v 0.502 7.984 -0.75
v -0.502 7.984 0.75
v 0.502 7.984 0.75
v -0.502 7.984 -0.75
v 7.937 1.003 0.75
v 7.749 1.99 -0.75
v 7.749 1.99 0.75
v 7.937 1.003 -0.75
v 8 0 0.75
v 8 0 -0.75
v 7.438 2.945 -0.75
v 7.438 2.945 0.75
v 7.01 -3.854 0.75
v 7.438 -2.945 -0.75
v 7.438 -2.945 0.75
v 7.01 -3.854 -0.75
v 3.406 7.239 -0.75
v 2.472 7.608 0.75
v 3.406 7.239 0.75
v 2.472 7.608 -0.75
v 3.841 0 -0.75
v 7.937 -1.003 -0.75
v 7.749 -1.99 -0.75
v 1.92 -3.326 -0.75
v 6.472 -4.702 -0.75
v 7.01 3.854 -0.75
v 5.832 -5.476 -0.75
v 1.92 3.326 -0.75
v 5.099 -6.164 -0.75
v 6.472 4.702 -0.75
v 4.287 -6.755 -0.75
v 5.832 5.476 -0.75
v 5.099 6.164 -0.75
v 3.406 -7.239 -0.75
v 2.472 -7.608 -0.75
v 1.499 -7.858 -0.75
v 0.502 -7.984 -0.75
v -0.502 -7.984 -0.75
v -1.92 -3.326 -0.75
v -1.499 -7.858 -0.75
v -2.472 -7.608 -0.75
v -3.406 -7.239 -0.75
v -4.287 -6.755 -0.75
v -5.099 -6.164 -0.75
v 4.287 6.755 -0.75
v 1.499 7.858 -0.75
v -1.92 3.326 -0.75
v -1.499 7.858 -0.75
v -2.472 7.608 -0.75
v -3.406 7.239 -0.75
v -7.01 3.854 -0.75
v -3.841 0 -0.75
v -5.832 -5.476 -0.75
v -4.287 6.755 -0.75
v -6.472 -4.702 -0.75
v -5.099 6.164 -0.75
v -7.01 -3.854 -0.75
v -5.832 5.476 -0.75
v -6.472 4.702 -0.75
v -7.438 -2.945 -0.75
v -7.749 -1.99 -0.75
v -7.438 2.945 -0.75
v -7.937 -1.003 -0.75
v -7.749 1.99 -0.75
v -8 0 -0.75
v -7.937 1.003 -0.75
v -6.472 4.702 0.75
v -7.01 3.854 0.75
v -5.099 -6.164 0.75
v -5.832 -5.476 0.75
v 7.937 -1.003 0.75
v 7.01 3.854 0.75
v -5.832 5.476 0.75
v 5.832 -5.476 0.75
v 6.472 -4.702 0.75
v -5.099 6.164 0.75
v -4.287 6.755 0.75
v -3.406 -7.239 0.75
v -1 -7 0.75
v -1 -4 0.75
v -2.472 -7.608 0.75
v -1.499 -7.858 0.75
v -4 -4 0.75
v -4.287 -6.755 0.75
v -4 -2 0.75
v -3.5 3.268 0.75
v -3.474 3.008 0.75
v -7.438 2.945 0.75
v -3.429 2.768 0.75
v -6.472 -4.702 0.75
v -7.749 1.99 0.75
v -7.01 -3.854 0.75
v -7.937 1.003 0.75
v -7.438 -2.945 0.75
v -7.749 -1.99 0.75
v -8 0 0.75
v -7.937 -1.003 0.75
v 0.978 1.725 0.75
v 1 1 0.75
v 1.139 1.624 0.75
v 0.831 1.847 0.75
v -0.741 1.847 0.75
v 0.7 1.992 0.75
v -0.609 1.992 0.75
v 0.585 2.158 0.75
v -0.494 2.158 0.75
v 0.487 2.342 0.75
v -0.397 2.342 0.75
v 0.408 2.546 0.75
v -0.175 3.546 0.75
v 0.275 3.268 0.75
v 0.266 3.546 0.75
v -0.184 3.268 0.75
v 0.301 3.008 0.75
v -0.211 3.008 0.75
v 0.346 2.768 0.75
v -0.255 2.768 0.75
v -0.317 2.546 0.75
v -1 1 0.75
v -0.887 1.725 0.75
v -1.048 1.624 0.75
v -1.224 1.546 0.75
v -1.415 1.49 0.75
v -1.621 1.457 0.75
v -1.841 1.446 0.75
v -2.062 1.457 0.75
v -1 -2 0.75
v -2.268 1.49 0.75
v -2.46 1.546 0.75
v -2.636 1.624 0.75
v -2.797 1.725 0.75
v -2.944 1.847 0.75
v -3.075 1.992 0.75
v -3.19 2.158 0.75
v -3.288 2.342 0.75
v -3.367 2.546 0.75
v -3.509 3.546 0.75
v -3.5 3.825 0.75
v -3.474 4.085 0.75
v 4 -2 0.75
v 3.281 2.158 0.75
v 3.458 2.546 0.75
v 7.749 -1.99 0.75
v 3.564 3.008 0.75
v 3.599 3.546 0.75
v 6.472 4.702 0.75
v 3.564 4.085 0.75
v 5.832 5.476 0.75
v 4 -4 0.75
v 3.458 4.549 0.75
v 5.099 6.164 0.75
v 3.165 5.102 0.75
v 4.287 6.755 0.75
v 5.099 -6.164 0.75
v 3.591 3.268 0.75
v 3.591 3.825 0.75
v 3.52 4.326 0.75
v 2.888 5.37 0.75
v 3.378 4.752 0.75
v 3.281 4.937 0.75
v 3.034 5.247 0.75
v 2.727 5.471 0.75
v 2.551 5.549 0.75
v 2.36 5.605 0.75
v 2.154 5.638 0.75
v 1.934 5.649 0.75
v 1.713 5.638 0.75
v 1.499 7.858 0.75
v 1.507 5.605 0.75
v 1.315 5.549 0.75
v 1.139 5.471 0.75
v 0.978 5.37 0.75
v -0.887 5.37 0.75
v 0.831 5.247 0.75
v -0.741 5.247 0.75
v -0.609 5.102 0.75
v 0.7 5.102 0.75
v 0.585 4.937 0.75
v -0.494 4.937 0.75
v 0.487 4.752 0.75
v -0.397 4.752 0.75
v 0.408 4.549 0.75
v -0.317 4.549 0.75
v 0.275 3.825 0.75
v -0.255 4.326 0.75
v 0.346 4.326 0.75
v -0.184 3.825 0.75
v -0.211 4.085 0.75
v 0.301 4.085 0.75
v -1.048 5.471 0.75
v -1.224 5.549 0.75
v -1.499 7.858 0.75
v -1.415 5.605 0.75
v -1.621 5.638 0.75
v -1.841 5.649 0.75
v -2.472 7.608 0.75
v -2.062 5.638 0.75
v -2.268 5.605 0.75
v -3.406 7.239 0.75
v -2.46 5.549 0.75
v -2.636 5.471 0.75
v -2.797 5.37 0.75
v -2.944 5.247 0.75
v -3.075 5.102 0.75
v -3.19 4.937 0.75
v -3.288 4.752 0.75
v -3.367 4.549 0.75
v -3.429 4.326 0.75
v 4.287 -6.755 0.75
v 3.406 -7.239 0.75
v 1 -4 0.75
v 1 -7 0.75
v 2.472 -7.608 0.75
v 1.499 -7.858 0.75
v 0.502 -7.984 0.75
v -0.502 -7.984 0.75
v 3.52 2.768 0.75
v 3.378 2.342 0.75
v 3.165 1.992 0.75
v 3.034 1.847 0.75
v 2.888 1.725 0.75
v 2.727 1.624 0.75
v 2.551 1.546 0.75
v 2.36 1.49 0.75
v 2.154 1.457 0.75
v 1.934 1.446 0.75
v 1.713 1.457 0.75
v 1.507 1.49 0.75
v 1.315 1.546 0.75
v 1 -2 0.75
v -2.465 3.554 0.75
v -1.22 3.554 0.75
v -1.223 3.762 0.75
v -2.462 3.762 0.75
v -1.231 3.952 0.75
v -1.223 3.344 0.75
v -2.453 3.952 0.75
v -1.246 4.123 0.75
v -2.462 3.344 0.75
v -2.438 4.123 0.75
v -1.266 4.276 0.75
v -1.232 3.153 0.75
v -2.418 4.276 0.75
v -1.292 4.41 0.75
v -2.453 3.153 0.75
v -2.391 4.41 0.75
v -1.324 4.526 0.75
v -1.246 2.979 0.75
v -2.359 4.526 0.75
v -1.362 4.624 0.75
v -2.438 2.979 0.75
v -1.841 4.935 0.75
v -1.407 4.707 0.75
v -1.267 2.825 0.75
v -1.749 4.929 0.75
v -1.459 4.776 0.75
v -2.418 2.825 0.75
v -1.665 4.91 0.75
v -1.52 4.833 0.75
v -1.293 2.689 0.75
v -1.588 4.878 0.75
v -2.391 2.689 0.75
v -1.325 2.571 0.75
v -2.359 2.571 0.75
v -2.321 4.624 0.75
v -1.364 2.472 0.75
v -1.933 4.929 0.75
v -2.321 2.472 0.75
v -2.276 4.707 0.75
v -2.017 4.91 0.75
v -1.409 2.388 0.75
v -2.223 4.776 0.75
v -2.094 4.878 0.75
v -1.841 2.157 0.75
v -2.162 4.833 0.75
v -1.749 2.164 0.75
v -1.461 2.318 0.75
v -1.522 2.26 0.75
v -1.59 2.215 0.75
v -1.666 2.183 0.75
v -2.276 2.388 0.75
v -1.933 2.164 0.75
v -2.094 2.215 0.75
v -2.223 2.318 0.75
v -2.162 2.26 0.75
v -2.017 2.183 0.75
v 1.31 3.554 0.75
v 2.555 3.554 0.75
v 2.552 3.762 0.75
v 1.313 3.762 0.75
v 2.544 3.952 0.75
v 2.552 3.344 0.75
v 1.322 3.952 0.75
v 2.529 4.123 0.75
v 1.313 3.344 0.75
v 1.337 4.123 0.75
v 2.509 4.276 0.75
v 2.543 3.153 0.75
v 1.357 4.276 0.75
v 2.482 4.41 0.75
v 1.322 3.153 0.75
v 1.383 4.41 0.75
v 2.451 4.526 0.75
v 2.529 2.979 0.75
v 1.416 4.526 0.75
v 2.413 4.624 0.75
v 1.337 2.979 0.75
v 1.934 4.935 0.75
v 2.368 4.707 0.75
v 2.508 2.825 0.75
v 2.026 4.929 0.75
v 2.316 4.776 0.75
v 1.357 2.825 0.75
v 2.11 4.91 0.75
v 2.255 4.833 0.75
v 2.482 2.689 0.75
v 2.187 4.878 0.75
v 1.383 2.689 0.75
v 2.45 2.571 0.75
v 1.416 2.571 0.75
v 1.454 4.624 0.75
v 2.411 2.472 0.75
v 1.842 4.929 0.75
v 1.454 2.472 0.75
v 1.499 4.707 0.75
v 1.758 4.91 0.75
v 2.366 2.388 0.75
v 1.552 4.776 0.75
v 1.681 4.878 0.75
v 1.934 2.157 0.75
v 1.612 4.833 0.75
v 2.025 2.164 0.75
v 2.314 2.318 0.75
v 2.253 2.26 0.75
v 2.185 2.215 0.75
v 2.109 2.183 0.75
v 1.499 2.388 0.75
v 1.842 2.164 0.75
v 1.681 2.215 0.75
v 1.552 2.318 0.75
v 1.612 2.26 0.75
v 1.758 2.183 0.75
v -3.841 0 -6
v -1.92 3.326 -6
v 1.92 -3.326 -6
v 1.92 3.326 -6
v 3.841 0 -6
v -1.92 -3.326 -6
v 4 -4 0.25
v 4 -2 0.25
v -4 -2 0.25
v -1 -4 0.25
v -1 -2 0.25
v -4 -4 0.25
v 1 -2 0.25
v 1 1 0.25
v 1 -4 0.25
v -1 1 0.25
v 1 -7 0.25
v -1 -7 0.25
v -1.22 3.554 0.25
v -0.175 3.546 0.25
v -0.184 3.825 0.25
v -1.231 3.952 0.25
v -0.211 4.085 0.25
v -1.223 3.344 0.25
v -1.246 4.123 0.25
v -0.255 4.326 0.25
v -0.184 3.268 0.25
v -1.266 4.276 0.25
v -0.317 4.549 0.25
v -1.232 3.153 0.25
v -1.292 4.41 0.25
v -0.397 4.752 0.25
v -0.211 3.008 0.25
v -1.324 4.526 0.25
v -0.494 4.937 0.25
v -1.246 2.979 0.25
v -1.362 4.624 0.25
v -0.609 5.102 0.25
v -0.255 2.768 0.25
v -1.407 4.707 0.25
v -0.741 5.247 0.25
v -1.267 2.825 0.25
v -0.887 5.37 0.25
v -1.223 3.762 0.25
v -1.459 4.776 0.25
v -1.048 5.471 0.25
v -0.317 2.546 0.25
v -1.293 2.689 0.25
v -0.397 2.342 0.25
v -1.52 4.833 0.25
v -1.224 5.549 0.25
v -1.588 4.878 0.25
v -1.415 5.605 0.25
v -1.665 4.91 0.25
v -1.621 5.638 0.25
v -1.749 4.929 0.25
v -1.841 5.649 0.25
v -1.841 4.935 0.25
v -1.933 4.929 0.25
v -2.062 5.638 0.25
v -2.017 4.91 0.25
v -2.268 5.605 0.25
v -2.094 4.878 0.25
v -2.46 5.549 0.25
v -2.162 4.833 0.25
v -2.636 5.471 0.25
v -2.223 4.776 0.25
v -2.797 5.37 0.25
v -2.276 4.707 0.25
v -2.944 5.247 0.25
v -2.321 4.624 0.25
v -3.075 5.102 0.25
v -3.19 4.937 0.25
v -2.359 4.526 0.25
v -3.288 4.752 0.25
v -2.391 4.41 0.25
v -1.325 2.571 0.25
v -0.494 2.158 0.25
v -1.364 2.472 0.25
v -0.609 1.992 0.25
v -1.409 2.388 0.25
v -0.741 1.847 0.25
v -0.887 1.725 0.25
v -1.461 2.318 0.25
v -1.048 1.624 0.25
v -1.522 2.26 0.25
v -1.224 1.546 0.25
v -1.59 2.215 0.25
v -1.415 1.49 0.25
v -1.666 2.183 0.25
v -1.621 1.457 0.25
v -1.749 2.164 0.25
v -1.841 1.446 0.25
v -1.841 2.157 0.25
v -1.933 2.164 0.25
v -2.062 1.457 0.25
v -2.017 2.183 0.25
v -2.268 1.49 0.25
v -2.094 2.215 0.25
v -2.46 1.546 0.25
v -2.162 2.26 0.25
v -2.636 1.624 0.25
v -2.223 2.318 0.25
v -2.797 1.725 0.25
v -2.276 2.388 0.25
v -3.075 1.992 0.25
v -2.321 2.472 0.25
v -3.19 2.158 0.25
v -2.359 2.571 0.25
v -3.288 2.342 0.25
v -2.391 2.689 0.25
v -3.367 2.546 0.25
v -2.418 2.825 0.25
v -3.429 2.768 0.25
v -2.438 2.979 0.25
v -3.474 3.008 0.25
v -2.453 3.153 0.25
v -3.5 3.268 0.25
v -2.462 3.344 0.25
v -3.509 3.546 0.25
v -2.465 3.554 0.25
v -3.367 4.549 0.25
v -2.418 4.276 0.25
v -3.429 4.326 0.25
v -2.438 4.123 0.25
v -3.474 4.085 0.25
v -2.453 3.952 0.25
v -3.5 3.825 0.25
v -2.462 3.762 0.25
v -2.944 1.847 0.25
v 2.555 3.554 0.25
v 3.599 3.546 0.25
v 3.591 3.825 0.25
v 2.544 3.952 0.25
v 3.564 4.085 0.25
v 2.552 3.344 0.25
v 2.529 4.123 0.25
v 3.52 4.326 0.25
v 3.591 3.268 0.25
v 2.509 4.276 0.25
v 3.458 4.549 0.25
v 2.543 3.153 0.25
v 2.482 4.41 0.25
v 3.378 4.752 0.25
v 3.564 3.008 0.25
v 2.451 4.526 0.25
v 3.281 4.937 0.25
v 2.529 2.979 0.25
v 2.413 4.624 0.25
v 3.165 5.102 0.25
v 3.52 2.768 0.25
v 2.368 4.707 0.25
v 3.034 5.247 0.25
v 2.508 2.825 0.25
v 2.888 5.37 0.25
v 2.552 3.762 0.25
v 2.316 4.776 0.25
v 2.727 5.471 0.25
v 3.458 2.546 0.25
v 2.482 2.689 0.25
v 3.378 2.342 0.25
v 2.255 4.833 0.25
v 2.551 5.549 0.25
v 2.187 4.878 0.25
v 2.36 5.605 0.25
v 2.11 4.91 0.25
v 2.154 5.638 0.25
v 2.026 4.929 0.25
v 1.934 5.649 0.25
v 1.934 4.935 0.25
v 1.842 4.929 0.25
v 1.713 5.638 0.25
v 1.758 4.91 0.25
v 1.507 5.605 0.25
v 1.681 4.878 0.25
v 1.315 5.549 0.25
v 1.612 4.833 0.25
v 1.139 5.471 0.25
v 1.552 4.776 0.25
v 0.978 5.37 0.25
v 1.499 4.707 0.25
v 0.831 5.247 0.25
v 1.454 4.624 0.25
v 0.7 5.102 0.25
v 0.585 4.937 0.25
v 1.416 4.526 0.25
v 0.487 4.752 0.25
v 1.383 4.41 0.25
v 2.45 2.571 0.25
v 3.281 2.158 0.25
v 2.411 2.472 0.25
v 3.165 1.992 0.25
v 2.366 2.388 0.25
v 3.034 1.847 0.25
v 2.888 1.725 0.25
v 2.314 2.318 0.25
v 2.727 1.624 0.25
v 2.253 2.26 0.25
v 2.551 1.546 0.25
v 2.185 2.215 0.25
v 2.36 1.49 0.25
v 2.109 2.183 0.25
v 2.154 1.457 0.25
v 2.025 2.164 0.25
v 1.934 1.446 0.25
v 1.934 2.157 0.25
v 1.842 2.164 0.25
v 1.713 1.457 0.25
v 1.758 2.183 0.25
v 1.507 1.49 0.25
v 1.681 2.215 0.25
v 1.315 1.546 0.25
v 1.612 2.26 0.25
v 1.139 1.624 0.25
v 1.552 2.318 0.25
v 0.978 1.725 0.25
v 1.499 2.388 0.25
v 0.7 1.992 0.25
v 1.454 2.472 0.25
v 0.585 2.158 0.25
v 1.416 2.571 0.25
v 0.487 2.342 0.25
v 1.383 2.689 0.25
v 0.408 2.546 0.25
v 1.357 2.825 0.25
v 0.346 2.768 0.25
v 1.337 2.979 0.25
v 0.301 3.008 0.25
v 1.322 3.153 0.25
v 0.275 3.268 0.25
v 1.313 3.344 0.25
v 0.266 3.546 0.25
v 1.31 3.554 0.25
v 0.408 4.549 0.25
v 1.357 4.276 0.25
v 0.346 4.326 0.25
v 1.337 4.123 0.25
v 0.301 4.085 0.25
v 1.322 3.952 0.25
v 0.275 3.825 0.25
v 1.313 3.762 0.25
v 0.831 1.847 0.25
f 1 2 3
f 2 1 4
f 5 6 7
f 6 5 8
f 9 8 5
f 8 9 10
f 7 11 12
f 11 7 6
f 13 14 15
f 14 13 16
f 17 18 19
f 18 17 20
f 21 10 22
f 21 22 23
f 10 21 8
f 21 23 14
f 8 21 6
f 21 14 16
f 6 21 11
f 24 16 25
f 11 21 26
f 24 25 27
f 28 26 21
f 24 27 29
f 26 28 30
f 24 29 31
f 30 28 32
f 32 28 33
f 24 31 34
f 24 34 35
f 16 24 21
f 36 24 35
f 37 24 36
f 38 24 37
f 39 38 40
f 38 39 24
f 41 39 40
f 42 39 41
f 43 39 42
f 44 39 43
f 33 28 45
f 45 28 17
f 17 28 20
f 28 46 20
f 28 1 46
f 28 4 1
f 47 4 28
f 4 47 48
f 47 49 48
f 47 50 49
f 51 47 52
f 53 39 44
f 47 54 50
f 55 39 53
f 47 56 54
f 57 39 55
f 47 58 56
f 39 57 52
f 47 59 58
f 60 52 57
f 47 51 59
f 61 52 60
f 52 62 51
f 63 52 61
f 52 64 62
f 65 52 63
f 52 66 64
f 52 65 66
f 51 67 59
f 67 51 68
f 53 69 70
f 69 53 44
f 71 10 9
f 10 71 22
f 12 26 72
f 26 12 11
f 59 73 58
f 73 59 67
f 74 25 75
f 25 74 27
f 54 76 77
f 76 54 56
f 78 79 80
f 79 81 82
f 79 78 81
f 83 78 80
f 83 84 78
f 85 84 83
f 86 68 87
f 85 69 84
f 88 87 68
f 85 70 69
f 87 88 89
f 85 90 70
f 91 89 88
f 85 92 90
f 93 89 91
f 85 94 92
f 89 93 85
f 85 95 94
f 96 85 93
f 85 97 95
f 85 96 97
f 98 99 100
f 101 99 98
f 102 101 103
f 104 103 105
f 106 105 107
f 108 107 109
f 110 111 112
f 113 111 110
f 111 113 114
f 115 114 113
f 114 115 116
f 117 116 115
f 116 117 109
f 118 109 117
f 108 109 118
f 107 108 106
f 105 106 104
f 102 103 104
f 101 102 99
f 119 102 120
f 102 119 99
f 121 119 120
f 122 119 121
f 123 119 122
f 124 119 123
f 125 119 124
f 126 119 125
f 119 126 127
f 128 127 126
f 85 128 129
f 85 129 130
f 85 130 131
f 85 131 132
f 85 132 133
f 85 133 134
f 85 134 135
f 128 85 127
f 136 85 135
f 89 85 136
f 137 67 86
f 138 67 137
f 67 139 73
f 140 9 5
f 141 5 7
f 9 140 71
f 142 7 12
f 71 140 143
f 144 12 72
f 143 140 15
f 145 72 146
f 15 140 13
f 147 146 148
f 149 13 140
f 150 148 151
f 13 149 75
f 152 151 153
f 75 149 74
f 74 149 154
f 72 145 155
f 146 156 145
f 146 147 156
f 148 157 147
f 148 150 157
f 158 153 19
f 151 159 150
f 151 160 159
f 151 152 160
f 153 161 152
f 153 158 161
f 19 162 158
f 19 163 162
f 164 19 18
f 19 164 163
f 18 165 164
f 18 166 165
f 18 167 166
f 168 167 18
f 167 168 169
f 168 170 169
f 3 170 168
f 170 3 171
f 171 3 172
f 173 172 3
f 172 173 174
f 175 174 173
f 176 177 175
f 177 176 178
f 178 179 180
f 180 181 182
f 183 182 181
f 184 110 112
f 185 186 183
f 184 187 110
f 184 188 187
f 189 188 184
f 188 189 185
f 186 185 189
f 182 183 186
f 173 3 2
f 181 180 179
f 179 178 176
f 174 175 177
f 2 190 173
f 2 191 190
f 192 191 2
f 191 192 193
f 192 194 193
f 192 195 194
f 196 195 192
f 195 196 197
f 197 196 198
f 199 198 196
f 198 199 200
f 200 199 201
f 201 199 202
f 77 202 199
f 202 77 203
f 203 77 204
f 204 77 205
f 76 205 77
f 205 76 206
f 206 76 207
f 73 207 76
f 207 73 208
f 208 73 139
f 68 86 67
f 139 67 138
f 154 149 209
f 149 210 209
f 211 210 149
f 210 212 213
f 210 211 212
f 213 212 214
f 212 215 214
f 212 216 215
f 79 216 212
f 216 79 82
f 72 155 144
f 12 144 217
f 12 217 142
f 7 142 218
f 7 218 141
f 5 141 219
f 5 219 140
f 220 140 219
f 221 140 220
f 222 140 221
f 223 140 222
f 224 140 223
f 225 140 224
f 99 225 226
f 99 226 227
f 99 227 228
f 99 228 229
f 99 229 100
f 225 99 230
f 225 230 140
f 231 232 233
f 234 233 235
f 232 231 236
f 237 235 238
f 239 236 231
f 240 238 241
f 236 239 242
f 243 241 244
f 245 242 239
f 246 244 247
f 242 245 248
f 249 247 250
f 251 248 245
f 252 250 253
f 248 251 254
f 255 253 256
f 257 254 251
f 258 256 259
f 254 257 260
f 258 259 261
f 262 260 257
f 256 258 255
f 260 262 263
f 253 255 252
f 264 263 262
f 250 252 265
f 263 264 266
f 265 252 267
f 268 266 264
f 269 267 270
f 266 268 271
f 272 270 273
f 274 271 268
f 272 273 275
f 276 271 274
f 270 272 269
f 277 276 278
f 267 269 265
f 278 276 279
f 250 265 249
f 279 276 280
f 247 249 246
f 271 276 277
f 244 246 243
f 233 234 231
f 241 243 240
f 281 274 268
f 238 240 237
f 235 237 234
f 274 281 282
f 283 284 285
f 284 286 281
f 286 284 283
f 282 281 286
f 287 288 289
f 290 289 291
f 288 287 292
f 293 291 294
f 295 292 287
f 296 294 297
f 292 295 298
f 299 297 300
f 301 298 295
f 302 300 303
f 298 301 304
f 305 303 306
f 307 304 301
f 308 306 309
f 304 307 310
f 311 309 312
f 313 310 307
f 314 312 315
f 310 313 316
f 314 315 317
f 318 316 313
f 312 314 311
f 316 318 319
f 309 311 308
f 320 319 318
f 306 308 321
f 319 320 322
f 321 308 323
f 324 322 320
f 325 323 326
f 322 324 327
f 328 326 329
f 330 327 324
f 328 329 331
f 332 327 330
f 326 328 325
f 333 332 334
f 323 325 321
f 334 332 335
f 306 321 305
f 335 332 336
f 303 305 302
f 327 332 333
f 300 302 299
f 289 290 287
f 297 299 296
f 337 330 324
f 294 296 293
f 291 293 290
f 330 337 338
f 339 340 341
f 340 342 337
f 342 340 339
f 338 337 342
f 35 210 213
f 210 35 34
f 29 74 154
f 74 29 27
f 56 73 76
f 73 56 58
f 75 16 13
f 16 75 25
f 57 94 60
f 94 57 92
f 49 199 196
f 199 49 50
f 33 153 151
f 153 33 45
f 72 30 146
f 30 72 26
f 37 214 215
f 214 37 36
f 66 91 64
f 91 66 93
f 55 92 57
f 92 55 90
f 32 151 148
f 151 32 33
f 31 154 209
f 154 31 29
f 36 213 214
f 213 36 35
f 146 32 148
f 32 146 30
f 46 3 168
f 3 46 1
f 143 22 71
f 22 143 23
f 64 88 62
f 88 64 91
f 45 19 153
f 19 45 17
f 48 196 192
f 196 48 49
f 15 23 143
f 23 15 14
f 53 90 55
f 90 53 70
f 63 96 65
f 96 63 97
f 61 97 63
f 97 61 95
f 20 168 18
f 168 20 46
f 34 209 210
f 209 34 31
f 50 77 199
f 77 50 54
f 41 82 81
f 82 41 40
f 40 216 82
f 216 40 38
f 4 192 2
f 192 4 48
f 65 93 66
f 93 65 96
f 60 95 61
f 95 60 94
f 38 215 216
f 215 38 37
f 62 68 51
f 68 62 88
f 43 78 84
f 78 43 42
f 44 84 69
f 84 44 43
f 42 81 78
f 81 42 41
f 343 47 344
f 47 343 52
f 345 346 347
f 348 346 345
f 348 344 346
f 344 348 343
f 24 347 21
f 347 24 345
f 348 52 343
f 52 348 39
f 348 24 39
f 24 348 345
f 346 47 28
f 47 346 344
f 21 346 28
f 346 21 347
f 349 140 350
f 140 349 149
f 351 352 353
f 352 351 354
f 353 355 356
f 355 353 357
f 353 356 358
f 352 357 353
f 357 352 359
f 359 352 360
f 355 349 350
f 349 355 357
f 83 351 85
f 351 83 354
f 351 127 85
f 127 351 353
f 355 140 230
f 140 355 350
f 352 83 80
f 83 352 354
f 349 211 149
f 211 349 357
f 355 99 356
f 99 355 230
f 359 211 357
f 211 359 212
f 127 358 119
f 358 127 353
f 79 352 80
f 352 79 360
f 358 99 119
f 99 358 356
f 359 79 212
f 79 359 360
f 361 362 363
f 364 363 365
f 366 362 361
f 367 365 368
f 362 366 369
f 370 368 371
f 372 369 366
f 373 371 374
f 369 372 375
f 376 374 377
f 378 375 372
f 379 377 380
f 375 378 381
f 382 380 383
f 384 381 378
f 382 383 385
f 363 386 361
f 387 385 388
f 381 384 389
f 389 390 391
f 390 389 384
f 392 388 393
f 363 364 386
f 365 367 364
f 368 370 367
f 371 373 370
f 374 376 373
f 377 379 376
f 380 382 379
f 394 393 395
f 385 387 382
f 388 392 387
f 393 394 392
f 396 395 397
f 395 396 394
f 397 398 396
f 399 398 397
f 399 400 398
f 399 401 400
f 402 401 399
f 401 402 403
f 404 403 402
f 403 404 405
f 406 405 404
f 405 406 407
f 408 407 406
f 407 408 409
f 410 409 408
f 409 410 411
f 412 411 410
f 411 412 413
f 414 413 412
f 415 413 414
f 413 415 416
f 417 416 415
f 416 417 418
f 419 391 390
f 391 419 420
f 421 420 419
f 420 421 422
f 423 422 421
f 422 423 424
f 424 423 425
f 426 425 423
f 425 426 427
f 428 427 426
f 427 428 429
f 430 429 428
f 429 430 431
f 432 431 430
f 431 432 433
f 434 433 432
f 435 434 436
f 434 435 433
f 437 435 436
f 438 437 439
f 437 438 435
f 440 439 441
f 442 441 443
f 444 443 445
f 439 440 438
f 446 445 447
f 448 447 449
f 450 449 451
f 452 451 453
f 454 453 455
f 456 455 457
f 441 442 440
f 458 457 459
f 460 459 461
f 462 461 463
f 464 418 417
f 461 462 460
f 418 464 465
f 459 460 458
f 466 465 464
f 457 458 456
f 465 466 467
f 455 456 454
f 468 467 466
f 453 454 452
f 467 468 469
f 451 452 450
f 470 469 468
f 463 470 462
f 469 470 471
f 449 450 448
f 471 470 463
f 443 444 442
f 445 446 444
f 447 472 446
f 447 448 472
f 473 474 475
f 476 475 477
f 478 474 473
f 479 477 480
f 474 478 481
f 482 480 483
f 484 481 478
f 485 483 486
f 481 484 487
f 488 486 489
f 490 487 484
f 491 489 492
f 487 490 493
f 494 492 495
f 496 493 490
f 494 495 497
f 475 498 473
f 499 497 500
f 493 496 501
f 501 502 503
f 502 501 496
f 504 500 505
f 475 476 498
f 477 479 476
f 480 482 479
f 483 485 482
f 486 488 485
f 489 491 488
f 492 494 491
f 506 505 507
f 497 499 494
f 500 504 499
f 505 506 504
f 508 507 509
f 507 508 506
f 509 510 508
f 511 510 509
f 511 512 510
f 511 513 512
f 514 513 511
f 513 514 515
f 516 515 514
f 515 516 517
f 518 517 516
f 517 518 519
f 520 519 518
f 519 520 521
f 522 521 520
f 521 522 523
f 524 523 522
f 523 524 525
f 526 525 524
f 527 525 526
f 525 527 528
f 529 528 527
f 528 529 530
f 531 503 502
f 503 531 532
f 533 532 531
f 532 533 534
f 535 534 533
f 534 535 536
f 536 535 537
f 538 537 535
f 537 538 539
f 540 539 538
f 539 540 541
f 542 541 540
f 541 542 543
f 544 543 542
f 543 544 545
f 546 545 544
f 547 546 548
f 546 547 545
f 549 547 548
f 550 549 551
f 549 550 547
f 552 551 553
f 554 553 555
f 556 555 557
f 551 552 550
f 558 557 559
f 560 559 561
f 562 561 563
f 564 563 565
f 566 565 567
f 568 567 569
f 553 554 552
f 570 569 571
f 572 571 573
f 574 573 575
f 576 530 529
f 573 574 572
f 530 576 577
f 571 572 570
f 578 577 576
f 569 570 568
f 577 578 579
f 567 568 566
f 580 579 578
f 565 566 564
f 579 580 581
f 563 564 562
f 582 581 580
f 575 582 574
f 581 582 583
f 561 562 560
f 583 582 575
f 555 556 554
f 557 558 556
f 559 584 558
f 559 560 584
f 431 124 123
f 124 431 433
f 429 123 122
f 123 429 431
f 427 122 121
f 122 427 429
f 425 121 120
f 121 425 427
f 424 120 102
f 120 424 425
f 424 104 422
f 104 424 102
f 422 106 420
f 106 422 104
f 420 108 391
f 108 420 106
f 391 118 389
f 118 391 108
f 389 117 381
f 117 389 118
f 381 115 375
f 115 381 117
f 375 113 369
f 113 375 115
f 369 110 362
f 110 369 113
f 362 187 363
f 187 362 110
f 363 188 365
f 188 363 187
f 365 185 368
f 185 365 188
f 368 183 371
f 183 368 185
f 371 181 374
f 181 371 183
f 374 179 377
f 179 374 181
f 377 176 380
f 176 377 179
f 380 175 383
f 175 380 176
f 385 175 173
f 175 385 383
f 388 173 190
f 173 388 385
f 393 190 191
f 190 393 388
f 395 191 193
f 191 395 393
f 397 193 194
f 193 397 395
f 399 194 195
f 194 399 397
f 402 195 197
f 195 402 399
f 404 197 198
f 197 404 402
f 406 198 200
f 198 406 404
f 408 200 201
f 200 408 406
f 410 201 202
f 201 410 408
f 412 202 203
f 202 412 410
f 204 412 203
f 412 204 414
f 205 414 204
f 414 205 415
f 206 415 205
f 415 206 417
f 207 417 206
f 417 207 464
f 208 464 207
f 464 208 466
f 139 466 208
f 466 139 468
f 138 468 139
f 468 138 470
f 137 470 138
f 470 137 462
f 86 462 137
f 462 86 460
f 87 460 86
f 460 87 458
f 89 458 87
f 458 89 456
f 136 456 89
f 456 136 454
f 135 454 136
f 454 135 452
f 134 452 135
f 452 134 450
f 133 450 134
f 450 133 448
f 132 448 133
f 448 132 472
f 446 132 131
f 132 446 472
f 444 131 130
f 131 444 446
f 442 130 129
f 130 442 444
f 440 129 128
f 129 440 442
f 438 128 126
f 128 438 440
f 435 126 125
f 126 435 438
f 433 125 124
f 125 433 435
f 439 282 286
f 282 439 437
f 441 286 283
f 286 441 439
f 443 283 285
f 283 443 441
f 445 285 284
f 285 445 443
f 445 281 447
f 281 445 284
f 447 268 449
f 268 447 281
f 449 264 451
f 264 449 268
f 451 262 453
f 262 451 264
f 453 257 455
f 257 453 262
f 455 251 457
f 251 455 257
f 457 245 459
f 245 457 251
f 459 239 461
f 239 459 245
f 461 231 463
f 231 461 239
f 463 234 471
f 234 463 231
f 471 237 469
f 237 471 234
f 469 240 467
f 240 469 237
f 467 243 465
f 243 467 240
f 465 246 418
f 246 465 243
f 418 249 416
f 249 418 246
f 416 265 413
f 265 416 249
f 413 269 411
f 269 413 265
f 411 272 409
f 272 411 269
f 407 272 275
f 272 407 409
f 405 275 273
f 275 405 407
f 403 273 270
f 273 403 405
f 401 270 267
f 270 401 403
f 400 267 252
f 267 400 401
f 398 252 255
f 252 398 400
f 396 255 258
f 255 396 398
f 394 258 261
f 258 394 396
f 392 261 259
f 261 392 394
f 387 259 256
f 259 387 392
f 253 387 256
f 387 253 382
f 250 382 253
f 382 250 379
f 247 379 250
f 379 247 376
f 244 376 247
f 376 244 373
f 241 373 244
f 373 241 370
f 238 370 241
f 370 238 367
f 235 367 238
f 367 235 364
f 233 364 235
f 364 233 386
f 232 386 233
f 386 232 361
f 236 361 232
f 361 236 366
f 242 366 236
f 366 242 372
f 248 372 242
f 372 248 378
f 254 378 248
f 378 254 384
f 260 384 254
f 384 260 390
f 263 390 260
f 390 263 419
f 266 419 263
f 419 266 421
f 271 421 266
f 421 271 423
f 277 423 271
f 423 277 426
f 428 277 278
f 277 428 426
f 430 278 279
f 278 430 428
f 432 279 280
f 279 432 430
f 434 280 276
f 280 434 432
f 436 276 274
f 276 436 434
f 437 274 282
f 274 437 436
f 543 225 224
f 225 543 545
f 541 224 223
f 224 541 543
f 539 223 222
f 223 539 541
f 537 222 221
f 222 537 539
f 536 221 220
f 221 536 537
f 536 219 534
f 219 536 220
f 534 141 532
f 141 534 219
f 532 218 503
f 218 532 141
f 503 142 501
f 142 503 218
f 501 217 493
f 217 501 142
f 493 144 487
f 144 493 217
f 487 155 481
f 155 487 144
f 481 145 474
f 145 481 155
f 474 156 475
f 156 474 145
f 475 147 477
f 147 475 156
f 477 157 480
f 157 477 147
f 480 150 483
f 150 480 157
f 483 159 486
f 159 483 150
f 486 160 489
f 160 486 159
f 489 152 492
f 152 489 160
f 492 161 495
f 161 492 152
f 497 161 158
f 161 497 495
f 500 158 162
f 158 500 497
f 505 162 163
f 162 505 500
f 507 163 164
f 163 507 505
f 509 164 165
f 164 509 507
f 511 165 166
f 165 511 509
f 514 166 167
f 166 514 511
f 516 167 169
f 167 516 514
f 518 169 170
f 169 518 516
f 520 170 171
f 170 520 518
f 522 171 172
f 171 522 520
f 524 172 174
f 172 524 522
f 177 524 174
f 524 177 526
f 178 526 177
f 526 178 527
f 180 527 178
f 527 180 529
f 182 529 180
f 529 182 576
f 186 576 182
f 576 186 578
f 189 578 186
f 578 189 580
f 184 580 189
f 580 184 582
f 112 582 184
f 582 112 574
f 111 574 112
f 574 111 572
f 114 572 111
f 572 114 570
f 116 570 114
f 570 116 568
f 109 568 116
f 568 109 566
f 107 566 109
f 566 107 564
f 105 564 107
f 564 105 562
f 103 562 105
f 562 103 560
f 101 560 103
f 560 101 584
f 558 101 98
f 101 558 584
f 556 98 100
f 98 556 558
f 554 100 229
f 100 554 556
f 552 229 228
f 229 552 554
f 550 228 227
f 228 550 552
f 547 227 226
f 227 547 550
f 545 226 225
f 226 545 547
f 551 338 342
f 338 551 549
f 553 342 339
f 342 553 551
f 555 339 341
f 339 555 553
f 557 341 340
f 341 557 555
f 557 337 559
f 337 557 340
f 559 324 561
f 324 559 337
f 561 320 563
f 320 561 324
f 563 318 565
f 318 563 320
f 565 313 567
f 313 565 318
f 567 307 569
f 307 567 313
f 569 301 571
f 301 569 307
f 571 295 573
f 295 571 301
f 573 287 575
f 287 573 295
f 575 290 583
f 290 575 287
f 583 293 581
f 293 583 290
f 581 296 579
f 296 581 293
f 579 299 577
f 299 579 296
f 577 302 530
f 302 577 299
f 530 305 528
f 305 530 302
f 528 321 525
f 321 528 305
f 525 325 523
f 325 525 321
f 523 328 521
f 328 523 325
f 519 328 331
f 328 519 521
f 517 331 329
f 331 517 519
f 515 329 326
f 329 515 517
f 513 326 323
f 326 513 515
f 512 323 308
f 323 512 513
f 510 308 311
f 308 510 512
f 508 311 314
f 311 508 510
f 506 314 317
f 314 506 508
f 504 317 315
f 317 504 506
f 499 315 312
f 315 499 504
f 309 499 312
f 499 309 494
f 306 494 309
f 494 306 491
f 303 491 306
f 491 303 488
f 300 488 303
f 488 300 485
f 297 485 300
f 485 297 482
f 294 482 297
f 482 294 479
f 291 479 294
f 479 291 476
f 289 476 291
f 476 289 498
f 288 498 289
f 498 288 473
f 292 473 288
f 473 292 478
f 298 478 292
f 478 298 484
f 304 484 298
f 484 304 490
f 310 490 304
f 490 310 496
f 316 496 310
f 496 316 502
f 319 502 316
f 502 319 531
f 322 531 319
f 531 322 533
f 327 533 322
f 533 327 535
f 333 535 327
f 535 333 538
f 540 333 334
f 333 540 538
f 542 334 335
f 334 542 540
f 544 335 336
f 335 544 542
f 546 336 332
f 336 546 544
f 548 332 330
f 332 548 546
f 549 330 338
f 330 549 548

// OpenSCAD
$fn = 50;


difference() {
	union() {
		translate(v = [0, 0, -0.7500000000]) {
			cylinder(h = 1.5000000000, r = 8.0000000000);
		}
		translate(v = [0, 0, -6]) {
			linear_extrude(height = 6) {
				polygon(points = [[3.8408550000, 0.0000000000], [1.9204275000, 3.3262780023], [-1.9204275000, 3.3262780023], [-3.8408550000, 0.0000000000], [-1.9204275000, -3.3262780023], [1.9204275000, -3.3262780023]]);
			}
		}
	}
	union() {
		#translate(v = [-4.0000000000, -4.0000000000, 0.2500000000]) {
			cube(size = [8, 2, 0.5000000000]);
		}
		#translate(v = [-1.0000000000, -7.0000000000, 0.2500000000]) {
			cube(size = [2, 8, 0.5000000000]);
		}
		#translate(v = [0, 3.5000000000, 0.2500000000]) {
			linear_extrude(height = 0.5000000000) {
				text(font = "SegoiUI:Bold", halign = "center", size = 4, text = "00", valign = "center");
			}
		}
	}
}
